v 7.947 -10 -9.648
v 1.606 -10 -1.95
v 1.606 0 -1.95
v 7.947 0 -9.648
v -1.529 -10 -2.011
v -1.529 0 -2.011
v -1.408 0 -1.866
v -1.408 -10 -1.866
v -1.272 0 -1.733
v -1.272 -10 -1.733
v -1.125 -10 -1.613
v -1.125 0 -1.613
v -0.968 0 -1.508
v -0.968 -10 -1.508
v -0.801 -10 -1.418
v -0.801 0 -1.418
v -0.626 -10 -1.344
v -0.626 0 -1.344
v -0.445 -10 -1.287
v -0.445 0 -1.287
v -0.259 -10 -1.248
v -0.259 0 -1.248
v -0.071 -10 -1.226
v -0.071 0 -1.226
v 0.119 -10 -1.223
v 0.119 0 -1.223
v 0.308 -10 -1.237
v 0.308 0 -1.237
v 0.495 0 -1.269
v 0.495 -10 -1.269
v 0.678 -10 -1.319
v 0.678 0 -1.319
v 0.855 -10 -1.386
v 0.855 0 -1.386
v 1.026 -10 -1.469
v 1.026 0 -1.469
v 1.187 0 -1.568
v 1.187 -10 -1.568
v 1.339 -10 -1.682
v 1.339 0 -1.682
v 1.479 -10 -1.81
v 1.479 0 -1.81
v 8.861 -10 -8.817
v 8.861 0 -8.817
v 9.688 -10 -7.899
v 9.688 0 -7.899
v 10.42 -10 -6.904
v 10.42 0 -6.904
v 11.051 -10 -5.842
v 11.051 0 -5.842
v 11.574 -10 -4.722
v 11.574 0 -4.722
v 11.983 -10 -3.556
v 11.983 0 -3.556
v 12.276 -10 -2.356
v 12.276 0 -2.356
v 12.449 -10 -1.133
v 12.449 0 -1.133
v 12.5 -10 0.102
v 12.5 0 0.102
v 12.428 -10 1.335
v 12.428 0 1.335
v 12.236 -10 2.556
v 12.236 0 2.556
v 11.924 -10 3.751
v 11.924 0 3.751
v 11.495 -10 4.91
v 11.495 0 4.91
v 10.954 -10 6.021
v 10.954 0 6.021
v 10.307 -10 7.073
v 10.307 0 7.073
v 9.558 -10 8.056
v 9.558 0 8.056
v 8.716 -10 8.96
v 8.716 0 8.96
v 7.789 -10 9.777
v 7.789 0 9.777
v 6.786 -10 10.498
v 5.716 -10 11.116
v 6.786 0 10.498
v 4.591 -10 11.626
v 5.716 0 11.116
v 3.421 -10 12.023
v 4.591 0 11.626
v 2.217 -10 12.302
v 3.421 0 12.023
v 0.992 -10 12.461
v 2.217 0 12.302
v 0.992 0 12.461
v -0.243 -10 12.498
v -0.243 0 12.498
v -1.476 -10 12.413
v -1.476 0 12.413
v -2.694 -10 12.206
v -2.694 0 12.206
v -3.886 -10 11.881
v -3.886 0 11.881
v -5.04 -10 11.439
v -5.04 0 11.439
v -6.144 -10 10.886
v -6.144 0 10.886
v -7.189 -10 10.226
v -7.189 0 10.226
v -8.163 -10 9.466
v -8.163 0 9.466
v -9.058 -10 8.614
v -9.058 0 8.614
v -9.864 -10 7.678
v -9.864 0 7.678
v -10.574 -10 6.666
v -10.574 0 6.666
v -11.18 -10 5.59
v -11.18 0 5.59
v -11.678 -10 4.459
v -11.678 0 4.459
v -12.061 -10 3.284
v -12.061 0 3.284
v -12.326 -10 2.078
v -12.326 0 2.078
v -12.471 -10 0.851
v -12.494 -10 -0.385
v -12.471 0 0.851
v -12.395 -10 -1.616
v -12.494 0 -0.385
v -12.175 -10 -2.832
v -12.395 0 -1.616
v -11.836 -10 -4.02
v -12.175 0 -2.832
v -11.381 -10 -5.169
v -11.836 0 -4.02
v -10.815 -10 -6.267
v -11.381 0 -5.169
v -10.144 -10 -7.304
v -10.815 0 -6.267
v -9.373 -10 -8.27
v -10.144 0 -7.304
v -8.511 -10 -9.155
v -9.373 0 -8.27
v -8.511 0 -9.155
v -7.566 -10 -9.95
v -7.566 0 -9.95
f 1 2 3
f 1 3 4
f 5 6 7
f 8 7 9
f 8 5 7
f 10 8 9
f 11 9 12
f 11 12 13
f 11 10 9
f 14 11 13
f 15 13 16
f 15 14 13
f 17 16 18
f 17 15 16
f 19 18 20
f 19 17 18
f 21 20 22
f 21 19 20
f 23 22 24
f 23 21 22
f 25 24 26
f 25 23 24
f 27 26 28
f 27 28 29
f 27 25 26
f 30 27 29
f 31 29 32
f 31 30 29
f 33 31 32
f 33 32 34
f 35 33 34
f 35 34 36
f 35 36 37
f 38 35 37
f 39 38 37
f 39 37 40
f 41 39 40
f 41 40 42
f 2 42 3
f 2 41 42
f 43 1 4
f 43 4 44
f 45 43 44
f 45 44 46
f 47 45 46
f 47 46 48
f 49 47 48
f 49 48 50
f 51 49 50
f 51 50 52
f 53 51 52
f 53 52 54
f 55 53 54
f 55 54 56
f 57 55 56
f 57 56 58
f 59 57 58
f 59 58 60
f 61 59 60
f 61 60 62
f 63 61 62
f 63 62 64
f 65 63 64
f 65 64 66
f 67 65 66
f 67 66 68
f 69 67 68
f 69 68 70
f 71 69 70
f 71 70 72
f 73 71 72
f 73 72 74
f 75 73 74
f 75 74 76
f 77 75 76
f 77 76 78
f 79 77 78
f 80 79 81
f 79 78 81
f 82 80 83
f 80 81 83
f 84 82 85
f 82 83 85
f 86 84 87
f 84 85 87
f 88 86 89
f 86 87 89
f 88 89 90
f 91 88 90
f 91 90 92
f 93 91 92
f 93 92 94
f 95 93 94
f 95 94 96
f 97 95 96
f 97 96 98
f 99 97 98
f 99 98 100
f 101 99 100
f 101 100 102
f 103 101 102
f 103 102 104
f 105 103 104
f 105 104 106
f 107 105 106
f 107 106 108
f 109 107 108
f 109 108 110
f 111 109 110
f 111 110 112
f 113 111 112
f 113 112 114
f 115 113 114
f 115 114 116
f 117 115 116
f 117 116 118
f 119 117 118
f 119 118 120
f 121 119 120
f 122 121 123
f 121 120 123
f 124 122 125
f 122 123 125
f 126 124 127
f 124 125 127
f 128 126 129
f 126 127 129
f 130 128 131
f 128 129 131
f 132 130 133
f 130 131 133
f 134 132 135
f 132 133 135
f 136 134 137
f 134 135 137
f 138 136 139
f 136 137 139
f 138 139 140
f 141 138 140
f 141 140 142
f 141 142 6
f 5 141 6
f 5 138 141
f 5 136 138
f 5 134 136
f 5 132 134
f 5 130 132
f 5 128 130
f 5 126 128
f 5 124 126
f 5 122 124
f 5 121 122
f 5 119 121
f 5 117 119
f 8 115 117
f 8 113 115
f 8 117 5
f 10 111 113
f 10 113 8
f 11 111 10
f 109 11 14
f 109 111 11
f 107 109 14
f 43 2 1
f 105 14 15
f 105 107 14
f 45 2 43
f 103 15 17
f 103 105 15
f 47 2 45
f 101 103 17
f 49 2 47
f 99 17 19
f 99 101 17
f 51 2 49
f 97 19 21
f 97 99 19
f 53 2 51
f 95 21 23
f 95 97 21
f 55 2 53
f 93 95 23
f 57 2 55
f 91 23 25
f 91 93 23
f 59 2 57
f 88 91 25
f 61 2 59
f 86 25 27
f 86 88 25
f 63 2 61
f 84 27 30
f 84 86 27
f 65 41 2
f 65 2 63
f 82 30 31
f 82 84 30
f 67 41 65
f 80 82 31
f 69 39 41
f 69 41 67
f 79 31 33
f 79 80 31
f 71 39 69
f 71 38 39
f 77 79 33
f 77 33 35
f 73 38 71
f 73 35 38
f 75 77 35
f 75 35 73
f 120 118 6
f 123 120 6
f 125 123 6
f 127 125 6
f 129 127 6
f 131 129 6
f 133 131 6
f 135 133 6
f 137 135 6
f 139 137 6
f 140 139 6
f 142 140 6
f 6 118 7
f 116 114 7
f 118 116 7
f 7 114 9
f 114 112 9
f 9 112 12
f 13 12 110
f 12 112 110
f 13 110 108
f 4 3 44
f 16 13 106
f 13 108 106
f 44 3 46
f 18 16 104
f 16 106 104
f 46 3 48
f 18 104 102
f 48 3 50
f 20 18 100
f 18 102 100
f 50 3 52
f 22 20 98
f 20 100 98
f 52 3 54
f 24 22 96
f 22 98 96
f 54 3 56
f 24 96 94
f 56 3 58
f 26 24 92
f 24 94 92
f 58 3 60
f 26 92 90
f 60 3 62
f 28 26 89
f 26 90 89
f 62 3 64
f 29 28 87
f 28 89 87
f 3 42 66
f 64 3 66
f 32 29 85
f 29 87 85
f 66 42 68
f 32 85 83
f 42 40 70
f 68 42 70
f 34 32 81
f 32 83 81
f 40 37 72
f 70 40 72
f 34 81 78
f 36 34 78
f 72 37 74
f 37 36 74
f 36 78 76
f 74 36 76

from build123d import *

# Parameters (mm, degrees)
F0_R     = 12.5
F1_DEPTH = 10
F3_DEPTH = 25.4
F4_R     = 2


with BuildPart() as f1:
    # F0 (on Front) → F1 (new body)
    with BuildSketch(Plane.XZ):
        Circle(F0_R)
    extrude(amount=F1_DEPTH)

    # F2 (on face) → F3 (cut)
    with BuildSketch(Plane(origin=(0, 0, 0), x_dir=(-1, 0, 0), z_dir=(0, 1, 0))):
        with BuildLine():
            Line((0, 0), (-7.94716, -9.648453))
            ThreePointArc((-7.94716, -9.648453), (-0.243247, -12.497633), (7.565699, -9.950387))
            Line((7.565699, -9.950387), (0, 0))
        make_face()
    extrude(amount=-F3_DEPTH, mode=Mode.SUBTRACT)

    # F4
    f4_edges = [f1.edges().sort_by_distance(p)[0] for p in [
        (0, -5, 0),
    ]]
    fillet(f4_edges, radius=F4_R)


solid = f1.part
